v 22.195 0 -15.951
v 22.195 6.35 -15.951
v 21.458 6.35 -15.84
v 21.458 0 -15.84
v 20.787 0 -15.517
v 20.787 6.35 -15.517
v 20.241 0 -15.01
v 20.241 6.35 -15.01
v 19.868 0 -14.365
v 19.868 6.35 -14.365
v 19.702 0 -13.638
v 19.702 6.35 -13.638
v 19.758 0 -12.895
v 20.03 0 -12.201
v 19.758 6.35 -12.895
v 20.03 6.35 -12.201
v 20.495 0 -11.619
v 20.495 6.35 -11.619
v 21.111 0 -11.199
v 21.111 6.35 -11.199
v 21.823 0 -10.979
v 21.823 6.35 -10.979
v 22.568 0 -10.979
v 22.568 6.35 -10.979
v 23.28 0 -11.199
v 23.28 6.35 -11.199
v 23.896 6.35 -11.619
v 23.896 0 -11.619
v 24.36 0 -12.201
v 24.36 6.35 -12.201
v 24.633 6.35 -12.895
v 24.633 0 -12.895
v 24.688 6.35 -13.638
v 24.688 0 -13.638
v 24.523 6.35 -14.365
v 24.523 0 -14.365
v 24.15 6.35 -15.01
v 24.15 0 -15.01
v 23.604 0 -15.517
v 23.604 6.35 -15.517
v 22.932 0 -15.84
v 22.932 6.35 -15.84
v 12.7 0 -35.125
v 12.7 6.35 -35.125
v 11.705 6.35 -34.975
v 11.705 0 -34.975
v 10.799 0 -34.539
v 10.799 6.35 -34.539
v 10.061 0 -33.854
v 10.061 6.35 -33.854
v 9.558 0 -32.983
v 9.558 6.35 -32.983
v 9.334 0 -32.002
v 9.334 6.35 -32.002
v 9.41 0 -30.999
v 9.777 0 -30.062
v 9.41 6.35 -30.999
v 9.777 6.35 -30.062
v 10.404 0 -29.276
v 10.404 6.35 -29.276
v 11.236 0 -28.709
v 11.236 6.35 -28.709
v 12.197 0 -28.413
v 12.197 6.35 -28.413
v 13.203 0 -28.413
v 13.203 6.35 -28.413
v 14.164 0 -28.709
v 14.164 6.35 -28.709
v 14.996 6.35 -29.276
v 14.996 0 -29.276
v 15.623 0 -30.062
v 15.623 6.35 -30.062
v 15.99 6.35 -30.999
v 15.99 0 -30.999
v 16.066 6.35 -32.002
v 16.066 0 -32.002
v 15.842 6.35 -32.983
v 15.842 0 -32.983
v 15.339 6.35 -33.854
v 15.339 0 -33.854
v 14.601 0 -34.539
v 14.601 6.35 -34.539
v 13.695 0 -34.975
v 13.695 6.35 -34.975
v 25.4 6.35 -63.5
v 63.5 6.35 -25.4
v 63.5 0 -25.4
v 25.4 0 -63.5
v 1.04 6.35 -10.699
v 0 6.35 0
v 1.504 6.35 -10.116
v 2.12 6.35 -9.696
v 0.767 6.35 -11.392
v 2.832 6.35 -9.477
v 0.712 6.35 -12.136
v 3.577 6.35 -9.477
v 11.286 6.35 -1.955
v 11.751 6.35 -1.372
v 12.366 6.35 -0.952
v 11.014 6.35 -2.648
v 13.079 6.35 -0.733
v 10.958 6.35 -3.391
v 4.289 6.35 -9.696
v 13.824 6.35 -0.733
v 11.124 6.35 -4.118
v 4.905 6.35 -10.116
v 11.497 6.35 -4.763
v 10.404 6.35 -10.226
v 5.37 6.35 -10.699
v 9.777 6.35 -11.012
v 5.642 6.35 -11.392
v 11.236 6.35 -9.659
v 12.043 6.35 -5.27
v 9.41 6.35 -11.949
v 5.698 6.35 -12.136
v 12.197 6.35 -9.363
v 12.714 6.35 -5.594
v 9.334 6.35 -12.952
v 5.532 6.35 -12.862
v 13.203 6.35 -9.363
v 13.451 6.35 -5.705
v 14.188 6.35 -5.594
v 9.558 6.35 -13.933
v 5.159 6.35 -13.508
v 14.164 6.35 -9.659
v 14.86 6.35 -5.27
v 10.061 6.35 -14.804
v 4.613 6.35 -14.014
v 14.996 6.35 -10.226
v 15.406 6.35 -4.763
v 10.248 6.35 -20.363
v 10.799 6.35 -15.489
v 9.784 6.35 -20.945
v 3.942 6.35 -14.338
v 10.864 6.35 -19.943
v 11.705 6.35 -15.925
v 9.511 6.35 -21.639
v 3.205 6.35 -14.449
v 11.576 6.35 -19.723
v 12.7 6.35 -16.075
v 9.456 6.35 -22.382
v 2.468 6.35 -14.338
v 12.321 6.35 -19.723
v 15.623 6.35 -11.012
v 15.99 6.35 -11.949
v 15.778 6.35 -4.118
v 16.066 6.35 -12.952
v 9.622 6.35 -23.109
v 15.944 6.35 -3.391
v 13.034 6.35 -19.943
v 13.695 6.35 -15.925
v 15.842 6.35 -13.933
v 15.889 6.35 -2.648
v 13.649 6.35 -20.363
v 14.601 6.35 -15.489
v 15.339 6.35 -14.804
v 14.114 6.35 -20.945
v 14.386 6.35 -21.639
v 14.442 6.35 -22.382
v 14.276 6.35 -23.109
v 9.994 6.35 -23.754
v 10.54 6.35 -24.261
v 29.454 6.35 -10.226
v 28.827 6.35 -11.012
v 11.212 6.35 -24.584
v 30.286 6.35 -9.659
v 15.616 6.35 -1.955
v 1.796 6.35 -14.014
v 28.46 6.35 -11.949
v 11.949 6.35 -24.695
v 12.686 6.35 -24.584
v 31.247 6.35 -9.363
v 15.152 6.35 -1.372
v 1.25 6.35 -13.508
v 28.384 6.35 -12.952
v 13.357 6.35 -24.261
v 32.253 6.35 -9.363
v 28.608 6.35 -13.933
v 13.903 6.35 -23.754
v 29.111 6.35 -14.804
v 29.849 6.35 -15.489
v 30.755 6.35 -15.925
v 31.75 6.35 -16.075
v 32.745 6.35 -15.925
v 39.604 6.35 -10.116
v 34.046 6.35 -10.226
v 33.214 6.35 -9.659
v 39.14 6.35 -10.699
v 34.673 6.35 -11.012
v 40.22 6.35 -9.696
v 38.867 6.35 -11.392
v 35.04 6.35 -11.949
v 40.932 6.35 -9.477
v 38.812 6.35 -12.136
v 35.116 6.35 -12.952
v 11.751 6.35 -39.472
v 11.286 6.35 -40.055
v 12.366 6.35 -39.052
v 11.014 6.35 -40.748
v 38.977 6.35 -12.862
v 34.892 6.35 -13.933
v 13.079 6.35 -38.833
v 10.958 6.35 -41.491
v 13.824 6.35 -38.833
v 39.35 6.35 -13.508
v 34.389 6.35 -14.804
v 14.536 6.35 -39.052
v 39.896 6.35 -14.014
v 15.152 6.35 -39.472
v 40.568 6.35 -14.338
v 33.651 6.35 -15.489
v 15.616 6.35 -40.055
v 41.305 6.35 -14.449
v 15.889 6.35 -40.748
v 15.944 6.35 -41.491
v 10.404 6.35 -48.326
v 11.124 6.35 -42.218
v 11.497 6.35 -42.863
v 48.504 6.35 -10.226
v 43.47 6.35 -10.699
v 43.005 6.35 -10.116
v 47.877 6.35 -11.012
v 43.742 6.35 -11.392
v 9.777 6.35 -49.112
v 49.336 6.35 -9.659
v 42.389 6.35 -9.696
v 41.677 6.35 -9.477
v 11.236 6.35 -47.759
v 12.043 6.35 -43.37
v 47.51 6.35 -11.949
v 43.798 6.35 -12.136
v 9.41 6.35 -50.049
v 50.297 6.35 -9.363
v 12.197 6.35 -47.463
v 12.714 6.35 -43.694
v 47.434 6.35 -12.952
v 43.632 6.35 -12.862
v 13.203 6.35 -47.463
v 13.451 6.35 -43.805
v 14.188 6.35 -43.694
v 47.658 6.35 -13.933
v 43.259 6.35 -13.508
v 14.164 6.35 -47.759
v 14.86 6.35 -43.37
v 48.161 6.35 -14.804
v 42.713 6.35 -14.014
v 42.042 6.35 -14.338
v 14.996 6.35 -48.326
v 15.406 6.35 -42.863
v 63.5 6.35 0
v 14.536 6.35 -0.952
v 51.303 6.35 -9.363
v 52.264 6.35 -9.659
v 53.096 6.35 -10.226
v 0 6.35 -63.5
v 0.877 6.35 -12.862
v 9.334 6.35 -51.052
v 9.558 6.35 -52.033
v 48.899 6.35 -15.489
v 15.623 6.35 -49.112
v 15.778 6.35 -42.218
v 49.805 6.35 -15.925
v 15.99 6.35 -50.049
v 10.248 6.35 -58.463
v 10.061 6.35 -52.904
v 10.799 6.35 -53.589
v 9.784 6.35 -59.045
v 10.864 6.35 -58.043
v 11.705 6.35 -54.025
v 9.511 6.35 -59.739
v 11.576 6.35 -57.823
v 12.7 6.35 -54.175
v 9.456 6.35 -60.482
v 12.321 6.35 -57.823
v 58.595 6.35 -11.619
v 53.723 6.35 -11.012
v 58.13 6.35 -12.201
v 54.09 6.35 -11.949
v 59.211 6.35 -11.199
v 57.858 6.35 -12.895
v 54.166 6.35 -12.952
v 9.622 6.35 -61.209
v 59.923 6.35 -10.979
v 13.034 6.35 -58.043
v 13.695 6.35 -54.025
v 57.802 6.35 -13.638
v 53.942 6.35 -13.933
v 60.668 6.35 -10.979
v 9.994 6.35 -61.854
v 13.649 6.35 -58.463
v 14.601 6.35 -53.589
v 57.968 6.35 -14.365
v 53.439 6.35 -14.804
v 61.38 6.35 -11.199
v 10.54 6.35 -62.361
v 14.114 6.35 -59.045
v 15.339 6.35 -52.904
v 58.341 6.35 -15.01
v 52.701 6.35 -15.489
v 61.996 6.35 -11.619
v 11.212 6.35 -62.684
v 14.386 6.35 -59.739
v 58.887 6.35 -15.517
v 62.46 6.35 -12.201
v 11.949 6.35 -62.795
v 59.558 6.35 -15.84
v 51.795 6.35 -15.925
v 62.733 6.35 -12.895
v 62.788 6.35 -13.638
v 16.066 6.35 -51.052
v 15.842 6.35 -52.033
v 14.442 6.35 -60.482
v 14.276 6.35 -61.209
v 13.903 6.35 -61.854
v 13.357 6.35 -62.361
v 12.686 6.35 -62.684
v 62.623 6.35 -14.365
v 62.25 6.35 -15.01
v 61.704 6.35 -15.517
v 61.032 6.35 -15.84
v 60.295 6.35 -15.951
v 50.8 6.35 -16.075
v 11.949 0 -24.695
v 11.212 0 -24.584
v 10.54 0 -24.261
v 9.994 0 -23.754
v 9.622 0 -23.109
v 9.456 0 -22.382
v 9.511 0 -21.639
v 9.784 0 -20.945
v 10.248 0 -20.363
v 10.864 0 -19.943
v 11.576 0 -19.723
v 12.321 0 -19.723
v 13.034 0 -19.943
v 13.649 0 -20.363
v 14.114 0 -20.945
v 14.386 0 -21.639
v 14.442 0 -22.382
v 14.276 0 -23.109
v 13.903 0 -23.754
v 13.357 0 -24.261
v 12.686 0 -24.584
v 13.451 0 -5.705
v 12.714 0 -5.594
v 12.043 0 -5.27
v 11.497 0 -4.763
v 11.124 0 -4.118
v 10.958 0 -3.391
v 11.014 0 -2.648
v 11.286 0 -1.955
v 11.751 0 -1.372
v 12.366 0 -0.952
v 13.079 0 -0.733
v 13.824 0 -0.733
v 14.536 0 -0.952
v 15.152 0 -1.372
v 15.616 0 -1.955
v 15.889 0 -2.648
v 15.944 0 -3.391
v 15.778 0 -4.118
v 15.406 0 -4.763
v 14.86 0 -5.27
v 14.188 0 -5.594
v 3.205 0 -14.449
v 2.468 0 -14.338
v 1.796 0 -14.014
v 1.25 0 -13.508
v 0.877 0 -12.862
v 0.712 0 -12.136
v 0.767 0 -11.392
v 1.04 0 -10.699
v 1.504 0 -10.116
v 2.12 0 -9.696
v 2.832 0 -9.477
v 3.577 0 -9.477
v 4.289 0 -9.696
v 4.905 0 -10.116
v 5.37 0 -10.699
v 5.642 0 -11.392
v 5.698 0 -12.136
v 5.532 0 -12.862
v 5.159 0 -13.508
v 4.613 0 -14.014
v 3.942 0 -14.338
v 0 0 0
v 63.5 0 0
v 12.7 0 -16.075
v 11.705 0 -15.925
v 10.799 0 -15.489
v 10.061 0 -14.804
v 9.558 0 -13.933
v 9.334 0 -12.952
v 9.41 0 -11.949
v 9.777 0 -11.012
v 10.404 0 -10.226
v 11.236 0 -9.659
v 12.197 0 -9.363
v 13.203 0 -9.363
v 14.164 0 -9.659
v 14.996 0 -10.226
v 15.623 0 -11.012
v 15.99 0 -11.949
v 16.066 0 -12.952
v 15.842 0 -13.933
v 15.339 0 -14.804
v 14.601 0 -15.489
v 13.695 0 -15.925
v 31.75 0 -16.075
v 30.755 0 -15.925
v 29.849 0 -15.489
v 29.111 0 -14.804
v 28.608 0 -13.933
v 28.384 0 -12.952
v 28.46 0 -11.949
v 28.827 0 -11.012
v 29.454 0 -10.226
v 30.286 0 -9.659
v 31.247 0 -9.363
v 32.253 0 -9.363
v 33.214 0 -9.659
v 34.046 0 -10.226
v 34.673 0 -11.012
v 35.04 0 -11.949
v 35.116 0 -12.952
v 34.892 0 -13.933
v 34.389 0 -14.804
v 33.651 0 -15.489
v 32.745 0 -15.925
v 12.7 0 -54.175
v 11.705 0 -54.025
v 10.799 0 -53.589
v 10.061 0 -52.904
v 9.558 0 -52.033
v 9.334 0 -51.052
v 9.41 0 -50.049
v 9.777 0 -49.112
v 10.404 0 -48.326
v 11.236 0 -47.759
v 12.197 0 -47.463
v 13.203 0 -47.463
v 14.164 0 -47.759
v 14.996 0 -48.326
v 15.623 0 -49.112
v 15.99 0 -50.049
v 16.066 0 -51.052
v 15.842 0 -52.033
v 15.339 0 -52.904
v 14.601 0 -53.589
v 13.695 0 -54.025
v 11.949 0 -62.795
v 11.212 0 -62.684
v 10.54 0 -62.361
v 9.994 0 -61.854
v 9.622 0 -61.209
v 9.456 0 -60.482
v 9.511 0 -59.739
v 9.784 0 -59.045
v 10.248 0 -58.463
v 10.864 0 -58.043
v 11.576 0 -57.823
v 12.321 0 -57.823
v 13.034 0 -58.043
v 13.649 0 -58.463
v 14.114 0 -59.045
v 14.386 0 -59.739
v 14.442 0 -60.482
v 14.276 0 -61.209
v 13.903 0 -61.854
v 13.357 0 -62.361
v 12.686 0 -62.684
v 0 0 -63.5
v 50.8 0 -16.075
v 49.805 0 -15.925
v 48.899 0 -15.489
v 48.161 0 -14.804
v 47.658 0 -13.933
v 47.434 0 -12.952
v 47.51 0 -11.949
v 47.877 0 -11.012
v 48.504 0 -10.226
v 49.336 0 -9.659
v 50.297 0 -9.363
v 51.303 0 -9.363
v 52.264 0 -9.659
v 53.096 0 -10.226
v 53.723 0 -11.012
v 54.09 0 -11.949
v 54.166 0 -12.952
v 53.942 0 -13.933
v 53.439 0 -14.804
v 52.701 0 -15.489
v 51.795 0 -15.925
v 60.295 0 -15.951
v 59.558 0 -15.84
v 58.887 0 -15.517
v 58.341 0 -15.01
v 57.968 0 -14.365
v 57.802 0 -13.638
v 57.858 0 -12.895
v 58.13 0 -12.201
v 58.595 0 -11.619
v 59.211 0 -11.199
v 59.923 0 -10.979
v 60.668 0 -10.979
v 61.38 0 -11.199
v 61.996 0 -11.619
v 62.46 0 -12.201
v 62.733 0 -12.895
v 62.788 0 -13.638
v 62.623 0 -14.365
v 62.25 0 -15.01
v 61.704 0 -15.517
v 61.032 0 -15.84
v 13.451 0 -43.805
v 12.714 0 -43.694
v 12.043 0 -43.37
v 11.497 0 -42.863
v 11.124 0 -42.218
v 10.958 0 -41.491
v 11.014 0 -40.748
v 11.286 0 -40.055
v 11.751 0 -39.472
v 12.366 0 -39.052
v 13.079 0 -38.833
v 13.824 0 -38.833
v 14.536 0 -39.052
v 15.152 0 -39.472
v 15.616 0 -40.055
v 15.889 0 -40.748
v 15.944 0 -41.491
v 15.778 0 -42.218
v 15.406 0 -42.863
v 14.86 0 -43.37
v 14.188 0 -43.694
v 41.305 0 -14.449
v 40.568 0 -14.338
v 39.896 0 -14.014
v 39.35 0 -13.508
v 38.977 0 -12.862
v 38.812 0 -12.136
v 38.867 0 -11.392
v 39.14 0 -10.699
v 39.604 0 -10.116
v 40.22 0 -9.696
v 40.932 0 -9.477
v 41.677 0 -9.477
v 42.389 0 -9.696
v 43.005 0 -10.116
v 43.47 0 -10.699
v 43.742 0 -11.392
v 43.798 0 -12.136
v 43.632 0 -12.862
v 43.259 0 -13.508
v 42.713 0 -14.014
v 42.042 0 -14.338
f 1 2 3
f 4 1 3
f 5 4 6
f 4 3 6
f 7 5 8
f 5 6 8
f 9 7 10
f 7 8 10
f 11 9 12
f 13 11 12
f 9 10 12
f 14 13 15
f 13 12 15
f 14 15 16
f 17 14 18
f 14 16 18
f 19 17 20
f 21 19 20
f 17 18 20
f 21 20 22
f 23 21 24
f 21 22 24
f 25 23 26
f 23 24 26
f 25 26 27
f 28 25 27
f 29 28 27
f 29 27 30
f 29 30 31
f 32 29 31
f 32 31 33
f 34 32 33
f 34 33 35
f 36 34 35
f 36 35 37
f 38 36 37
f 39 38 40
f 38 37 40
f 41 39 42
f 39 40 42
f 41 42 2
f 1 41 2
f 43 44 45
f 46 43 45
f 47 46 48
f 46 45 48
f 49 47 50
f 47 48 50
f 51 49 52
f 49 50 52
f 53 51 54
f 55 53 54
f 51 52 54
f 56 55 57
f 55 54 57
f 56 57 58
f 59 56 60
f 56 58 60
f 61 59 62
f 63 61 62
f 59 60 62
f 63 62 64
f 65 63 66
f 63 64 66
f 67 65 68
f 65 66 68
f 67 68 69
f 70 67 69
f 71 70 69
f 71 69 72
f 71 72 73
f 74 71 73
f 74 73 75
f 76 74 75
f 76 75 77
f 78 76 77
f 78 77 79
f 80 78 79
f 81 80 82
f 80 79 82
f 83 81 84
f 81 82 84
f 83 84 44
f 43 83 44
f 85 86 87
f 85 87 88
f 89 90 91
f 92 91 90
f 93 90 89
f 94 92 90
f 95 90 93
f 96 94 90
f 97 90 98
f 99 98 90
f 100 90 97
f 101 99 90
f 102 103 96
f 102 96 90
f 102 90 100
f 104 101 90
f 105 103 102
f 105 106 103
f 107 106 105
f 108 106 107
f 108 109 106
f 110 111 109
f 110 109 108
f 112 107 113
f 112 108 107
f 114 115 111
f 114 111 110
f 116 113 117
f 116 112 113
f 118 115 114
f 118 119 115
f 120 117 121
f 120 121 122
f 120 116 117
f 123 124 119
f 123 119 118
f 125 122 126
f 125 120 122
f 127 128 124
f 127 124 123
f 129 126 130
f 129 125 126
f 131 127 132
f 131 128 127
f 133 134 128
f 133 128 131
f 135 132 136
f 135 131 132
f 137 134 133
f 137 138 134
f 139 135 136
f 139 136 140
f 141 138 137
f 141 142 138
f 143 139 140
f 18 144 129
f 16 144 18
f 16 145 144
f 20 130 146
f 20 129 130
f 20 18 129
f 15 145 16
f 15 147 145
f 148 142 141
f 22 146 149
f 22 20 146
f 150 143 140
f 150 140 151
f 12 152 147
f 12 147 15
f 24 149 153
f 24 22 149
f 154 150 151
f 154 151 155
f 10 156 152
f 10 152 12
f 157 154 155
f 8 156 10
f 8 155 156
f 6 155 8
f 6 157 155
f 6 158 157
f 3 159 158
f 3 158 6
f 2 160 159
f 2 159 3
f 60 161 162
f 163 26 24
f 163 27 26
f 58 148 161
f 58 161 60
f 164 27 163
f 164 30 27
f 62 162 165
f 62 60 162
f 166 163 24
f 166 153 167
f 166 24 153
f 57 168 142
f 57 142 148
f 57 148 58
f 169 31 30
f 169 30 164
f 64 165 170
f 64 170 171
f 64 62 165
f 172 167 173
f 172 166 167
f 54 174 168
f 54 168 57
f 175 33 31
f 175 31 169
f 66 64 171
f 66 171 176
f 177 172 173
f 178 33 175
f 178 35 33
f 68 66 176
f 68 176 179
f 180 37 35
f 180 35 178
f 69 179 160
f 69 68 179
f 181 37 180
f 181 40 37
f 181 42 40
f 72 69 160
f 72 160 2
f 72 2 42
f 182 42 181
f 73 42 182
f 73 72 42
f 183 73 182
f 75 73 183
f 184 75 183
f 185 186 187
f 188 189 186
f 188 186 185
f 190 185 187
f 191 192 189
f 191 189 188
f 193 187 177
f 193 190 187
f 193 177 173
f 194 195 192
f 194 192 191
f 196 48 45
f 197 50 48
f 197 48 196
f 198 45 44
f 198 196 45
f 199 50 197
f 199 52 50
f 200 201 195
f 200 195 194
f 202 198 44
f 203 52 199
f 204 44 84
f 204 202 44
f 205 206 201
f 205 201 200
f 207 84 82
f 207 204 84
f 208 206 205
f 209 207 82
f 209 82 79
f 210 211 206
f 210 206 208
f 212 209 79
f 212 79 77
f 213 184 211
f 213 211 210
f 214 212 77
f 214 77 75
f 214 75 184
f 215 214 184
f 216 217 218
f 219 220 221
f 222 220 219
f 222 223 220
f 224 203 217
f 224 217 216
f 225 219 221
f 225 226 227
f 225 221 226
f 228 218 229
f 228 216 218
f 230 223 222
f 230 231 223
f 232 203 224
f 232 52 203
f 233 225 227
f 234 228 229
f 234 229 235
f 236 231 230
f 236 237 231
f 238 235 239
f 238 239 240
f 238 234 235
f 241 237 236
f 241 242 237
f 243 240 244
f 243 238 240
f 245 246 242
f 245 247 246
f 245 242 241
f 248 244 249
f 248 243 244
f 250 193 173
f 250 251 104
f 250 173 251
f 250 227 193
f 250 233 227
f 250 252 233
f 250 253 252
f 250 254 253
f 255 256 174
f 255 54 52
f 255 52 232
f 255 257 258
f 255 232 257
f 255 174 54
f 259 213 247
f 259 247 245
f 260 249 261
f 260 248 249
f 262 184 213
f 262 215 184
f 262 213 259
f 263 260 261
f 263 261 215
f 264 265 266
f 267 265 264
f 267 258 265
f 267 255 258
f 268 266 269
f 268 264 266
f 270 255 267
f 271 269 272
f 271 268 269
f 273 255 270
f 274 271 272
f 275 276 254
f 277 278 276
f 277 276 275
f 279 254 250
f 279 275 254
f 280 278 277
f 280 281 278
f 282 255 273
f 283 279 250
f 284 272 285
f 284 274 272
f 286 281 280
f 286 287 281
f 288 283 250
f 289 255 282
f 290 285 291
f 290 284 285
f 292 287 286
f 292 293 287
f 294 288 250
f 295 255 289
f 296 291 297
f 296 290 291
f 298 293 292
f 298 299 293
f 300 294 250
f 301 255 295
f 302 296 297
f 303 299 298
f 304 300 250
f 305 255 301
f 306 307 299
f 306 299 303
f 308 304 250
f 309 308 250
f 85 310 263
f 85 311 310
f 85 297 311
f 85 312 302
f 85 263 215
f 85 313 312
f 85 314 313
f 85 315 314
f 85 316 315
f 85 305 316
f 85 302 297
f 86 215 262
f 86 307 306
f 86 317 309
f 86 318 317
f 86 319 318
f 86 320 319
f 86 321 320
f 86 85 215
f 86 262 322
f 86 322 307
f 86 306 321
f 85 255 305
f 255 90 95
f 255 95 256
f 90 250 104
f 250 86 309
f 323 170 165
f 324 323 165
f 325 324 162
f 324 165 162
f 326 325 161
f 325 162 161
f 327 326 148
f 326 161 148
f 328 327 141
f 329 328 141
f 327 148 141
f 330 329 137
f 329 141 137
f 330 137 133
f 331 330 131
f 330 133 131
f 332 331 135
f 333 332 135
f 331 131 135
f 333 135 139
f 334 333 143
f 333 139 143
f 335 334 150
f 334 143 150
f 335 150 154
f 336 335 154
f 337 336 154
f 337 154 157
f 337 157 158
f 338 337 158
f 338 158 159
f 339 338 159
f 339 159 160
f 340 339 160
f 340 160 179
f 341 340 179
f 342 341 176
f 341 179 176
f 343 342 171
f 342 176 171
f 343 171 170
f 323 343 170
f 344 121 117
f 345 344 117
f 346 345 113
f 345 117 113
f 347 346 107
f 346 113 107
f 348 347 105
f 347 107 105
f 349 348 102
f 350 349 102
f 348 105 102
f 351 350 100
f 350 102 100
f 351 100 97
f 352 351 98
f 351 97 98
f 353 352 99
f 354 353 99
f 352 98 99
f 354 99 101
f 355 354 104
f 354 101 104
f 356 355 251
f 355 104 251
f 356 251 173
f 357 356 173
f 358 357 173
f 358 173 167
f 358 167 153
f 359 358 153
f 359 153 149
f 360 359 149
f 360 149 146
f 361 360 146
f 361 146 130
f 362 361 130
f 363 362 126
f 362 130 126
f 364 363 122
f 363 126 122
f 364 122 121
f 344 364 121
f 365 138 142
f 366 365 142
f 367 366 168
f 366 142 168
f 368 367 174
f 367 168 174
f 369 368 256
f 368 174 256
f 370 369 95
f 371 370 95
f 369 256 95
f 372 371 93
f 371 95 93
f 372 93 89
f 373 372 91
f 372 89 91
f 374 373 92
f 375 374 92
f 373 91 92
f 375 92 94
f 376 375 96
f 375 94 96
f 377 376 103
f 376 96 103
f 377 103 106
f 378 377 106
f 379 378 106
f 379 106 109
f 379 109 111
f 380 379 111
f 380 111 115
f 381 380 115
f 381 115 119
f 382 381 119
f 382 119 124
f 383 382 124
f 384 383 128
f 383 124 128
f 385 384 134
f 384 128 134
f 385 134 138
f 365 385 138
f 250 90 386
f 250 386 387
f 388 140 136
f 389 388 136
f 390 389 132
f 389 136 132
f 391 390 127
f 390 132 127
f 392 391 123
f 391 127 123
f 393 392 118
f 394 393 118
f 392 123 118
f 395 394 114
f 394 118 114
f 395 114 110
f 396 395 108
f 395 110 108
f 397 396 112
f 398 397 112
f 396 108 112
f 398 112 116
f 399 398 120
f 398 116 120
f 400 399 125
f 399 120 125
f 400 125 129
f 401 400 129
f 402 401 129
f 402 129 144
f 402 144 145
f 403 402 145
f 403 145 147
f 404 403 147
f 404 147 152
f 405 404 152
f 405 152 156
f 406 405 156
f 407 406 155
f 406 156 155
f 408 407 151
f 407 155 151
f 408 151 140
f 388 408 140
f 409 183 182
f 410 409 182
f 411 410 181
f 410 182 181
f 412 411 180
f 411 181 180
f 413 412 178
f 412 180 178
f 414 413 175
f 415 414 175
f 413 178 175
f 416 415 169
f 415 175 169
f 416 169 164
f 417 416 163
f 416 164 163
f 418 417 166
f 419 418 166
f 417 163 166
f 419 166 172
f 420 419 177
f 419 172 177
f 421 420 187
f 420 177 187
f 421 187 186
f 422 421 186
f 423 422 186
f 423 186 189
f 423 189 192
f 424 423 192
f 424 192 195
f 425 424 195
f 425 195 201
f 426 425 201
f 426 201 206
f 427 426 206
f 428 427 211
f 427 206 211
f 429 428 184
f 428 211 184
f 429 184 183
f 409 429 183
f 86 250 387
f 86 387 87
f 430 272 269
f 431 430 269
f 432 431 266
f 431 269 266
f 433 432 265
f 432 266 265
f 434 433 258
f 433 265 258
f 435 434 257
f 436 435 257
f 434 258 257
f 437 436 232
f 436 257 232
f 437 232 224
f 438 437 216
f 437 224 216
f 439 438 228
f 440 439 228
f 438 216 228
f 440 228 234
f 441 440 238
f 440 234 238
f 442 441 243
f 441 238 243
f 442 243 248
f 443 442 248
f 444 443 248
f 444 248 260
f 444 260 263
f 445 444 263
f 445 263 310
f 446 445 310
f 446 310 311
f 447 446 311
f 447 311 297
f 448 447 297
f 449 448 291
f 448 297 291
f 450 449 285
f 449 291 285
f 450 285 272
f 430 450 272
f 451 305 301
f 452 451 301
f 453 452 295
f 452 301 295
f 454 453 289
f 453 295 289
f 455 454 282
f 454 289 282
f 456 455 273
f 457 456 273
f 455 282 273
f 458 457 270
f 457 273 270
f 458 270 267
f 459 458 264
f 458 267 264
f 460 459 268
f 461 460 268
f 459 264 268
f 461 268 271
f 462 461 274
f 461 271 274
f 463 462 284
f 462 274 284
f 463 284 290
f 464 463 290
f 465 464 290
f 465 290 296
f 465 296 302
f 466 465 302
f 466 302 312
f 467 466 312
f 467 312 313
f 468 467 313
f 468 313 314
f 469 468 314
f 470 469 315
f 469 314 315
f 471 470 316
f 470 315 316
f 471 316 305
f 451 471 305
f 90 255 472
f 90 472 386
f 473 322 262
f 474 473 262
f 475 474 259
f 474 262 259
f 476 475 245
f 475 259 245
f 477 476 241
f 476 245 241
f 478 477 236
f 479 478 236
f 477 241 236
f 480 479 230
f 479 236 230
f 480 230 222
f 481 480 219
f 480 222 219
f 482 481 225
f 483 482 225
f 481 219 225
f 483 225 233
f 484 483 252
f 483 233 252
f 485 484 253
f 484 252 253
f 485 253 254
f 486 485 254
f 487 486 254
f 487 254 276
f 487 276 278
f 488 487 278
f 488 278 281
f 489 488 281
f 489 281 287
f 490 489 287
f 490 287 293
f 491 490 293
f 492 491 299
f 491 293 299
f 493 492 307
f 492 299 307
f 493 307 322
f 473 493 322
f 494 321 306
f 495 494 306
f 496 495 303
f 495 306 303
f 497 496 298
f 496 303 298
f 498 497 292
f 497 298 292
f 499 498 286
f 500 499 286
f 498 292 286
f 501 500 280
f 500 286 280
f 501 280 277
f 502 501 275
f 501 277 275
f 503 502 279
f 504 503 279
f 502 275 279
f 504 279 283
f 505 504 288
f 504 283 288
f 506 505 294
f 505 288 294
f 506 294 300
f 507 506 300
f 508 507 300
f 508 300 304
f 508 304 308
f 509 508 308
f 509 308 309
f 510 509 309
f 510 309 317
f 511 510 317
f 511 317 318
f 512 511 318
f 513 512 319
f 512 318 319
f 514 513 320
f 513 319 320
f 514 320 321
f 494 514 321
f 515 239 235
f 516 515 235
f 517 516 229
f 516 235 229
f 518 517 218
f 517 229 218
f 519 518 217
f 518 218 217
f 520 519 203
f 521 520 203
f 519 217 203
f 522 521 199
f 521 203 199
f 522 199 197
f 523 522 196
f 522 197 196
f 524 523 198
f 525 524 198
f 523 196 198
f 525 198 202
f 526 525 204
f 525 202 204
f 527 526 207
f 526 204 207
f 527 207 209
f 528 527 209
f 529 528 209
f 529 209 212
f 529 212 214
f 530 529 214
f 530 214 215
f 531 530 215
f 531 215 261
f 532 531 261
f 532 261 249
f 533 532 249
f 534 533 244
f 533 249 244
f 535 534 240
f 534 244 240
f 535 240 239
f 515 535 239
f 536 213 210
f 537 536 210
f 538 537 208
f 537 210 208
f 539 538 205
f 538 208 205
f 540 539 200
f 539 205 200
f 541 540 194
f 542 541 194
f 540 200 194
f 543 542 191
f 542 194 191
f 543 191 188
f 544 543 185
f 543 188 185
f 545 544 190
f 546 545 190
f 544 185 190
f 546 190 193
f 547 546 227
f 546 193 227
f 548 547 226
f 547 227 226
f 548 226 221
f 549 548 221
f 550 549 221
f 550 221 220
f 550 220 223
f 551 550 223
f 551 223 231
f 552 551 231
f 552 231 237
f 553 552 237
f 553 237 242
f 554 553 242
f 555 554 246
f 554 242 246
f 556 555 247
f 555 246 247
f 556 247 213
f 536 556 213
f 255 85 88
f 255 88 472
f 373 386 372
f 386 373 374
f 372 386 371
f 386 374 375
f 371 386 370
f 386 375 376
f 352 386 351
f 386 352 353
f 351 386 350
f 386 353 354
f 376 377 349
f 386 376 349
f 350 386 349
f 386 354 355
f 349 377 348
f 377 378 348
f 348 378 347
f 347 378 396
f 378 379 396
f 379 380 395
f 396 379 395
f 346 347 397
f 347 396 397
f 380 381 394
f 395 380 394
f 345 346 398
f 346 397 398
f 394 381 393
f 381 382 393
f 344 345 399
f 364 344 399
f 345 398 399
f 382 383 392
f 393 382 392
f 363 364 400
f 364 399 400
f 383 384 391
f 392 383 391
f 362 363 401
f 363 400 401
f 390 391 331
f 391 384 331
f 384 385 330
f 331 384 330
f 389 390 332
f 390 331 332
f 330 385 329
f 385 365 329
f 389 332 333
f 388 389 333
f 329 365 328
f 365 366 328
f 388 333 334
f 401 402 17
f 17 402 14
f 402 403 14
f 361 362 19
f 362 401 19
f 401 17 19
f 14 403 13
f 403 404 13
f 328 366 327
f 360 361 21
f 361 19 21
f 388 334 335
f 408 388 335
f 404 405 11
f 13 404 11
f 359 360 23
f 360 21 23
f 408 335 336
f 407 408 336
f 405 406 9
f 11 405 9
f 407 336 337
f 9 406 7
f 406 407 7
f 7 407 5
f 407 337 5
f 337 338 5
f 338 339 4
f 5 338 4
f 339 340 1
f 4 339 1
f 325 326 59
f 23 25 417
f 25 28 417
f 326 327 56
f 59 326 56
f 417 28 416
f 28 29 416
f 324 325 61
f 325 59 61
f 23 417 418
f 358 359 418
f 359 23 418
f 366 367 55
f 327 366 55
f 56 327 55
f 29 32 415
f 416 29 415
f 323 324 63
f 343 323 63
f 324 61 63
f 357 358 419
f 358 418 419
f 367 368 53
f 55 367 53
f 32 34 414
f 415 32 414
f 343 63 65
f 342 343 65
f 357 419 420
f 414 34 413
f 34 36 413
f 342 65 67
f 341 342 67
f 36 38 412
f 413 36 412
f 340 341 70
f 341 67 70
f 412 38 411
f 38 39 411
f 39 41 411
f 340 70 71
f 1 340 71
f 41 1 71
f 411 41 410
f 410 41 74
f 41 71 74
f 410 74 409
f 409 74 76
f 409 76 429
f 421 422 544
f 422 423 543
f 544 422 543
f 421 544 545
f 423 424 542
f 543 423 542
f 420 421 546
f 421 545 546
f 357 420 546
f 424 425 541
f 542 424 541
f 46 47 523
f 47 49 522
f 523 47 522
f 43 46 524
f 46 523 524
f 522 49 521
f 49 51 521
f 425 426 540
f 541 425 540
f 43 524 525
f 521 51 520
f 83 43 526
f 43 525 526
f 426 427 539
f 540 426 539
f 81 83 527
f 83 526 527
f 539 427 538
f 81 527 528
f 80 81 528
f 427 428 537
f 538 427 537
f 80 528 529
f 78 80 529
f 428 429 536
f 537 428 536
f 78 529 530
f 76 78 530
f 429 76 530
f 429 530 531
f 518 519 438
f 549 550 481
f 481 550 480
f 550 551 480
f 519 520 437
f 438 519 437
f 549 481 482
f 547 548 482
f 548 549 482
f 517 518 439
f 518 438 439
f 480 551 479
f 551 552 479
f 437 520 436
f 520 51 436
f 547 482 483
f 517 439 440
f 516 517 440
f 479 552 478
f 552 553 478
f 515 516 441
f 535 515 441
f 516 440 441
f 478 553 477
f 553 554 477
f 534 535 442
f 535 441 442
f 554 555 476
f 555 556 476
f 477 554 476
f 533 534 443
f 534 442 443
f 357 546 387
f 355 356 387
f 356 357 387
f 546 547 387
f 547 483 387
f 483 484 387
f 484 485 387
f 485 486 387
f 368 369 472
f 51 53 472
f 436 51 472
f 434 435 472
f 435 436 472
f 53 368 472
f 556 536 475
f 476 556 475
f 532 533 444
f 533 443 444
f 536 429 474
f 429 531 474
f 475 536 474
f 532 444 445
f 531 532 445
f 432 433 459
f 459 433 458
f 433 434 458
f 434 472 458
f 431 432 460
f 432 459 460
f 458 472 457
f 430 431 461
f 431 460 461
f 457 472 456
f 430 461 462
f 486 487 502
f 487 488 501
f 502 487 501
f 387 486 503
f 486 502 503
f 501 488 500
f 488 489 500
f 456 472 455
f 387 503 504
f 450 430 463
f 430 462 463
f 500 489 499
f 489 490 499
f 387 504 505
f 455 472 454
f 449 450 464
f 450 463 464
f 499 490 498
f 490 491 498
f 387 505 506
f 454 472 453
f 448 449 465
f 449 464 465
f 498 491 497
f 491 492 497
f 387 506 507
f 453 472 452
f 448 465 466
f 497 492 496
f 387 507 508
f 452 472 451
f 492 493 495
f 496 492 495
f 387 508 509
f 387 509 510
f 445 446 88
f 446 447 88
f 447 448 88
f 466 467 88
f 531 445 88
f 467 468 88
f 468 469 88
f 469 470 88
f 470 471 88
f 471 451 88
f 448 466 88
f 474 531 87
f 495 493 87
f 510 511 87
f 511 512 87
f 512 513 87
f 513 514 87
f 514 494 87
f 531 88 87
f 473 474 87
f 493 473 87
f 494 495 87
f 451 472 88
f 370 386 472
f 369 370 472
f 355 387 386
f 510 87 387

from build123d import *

# Parameters (mm, degrees)
SKETCH1_R           = 2.5
SKETCH1_R_2         = 3.375
BOSS_EXTRUDE1_DEPTH = 6.35


with BuildPart() as part:
    # Sketch1 → Boss-Extrude1 (new body)
    with BuildSketch(Plane(origin=(0, 6.35, 0), x_dir=(1, 0, 0), z_dir=(0, 1, 0))):
        Polygon((25.4, 63.5), (0, 63.5), (0, 0), (63.5, 0), (63.5, 25.4), align=None)
        with Locations(Location((13.4512, 41.304668328, 0), (0, 0, 90))):
            Circle(SKETCH1_R, mode=Mode.SUBTRACT)
        with Locations(Location((11.9488, 60.295331672, 0), (0, 0, 90))):
            Circle(SKETCH1_R, mode=Mode.SUBTRACT)
        with Locations(Location((11.9488, 22.195331672, 0), (0, 0, 90))):
            Circle(SKETCH1_R, mode=Mode.SUBTRACT)
        with Locations(Location((13.4512, 3.204668328, 0), (0, 0, 90))):
            Circle(SKETCH1_R, mode=Mode.SUBTRACT)
        with Locations(Location((22.195331672, 13.4512, 0), (0, 0, 90))):
            Circle(SKETCH1_R, mode=Mode.SUBTRACT)
        with Locations(Location((3.204668328, 11.9488, 0), (0, 0, 90))):
            Circle(SKETCH1_R, mode=Mode.SUBTRACT)
        with Locations(Location((41.304668328, 11.9488, 0), (0, 0, 90))):
            Circle(SKETCH1_R, mode=Mode.SUBTRACT)
        with Locations(Location((60.295331672, 13.4512, 0), (0, 0, 90))):
            Circle(SKETCH1_R, mode=Mode.SUBTRACT)
        with Locations(Location((12.7, 50.8, 0), (0, 0, 90))):
            Circle(SKETCH1_R_2, mode=Mode.SUBTRACT)
        with Locations(Location((12.7, 31.75, 0), (0, 0, 90))):
            Circle(SKETCH1_R_2, mode=Mode.SUBTRACT)
        with Locations(Location((50.8, 12.7, 0), (0, 0, 90))):
            Circle(SKETCH1_R_2, mode=Mode.SUBTRACT)
        with Locations(Location((31.75, 12.7, 0), (0, 0, 90))):
            Circle(SKETCH1_R_2, mode=Mode.SUBTRACT)
        with Locations(Location((12.7, 12.7, 0), (0, 0, 90))):
            Circle(SKETCH1_R_2, mode=Mode.SUBTRACT)
    extrude(amount=-BOSS_EXTRUDE1_DEPTH)


solid = part.part
